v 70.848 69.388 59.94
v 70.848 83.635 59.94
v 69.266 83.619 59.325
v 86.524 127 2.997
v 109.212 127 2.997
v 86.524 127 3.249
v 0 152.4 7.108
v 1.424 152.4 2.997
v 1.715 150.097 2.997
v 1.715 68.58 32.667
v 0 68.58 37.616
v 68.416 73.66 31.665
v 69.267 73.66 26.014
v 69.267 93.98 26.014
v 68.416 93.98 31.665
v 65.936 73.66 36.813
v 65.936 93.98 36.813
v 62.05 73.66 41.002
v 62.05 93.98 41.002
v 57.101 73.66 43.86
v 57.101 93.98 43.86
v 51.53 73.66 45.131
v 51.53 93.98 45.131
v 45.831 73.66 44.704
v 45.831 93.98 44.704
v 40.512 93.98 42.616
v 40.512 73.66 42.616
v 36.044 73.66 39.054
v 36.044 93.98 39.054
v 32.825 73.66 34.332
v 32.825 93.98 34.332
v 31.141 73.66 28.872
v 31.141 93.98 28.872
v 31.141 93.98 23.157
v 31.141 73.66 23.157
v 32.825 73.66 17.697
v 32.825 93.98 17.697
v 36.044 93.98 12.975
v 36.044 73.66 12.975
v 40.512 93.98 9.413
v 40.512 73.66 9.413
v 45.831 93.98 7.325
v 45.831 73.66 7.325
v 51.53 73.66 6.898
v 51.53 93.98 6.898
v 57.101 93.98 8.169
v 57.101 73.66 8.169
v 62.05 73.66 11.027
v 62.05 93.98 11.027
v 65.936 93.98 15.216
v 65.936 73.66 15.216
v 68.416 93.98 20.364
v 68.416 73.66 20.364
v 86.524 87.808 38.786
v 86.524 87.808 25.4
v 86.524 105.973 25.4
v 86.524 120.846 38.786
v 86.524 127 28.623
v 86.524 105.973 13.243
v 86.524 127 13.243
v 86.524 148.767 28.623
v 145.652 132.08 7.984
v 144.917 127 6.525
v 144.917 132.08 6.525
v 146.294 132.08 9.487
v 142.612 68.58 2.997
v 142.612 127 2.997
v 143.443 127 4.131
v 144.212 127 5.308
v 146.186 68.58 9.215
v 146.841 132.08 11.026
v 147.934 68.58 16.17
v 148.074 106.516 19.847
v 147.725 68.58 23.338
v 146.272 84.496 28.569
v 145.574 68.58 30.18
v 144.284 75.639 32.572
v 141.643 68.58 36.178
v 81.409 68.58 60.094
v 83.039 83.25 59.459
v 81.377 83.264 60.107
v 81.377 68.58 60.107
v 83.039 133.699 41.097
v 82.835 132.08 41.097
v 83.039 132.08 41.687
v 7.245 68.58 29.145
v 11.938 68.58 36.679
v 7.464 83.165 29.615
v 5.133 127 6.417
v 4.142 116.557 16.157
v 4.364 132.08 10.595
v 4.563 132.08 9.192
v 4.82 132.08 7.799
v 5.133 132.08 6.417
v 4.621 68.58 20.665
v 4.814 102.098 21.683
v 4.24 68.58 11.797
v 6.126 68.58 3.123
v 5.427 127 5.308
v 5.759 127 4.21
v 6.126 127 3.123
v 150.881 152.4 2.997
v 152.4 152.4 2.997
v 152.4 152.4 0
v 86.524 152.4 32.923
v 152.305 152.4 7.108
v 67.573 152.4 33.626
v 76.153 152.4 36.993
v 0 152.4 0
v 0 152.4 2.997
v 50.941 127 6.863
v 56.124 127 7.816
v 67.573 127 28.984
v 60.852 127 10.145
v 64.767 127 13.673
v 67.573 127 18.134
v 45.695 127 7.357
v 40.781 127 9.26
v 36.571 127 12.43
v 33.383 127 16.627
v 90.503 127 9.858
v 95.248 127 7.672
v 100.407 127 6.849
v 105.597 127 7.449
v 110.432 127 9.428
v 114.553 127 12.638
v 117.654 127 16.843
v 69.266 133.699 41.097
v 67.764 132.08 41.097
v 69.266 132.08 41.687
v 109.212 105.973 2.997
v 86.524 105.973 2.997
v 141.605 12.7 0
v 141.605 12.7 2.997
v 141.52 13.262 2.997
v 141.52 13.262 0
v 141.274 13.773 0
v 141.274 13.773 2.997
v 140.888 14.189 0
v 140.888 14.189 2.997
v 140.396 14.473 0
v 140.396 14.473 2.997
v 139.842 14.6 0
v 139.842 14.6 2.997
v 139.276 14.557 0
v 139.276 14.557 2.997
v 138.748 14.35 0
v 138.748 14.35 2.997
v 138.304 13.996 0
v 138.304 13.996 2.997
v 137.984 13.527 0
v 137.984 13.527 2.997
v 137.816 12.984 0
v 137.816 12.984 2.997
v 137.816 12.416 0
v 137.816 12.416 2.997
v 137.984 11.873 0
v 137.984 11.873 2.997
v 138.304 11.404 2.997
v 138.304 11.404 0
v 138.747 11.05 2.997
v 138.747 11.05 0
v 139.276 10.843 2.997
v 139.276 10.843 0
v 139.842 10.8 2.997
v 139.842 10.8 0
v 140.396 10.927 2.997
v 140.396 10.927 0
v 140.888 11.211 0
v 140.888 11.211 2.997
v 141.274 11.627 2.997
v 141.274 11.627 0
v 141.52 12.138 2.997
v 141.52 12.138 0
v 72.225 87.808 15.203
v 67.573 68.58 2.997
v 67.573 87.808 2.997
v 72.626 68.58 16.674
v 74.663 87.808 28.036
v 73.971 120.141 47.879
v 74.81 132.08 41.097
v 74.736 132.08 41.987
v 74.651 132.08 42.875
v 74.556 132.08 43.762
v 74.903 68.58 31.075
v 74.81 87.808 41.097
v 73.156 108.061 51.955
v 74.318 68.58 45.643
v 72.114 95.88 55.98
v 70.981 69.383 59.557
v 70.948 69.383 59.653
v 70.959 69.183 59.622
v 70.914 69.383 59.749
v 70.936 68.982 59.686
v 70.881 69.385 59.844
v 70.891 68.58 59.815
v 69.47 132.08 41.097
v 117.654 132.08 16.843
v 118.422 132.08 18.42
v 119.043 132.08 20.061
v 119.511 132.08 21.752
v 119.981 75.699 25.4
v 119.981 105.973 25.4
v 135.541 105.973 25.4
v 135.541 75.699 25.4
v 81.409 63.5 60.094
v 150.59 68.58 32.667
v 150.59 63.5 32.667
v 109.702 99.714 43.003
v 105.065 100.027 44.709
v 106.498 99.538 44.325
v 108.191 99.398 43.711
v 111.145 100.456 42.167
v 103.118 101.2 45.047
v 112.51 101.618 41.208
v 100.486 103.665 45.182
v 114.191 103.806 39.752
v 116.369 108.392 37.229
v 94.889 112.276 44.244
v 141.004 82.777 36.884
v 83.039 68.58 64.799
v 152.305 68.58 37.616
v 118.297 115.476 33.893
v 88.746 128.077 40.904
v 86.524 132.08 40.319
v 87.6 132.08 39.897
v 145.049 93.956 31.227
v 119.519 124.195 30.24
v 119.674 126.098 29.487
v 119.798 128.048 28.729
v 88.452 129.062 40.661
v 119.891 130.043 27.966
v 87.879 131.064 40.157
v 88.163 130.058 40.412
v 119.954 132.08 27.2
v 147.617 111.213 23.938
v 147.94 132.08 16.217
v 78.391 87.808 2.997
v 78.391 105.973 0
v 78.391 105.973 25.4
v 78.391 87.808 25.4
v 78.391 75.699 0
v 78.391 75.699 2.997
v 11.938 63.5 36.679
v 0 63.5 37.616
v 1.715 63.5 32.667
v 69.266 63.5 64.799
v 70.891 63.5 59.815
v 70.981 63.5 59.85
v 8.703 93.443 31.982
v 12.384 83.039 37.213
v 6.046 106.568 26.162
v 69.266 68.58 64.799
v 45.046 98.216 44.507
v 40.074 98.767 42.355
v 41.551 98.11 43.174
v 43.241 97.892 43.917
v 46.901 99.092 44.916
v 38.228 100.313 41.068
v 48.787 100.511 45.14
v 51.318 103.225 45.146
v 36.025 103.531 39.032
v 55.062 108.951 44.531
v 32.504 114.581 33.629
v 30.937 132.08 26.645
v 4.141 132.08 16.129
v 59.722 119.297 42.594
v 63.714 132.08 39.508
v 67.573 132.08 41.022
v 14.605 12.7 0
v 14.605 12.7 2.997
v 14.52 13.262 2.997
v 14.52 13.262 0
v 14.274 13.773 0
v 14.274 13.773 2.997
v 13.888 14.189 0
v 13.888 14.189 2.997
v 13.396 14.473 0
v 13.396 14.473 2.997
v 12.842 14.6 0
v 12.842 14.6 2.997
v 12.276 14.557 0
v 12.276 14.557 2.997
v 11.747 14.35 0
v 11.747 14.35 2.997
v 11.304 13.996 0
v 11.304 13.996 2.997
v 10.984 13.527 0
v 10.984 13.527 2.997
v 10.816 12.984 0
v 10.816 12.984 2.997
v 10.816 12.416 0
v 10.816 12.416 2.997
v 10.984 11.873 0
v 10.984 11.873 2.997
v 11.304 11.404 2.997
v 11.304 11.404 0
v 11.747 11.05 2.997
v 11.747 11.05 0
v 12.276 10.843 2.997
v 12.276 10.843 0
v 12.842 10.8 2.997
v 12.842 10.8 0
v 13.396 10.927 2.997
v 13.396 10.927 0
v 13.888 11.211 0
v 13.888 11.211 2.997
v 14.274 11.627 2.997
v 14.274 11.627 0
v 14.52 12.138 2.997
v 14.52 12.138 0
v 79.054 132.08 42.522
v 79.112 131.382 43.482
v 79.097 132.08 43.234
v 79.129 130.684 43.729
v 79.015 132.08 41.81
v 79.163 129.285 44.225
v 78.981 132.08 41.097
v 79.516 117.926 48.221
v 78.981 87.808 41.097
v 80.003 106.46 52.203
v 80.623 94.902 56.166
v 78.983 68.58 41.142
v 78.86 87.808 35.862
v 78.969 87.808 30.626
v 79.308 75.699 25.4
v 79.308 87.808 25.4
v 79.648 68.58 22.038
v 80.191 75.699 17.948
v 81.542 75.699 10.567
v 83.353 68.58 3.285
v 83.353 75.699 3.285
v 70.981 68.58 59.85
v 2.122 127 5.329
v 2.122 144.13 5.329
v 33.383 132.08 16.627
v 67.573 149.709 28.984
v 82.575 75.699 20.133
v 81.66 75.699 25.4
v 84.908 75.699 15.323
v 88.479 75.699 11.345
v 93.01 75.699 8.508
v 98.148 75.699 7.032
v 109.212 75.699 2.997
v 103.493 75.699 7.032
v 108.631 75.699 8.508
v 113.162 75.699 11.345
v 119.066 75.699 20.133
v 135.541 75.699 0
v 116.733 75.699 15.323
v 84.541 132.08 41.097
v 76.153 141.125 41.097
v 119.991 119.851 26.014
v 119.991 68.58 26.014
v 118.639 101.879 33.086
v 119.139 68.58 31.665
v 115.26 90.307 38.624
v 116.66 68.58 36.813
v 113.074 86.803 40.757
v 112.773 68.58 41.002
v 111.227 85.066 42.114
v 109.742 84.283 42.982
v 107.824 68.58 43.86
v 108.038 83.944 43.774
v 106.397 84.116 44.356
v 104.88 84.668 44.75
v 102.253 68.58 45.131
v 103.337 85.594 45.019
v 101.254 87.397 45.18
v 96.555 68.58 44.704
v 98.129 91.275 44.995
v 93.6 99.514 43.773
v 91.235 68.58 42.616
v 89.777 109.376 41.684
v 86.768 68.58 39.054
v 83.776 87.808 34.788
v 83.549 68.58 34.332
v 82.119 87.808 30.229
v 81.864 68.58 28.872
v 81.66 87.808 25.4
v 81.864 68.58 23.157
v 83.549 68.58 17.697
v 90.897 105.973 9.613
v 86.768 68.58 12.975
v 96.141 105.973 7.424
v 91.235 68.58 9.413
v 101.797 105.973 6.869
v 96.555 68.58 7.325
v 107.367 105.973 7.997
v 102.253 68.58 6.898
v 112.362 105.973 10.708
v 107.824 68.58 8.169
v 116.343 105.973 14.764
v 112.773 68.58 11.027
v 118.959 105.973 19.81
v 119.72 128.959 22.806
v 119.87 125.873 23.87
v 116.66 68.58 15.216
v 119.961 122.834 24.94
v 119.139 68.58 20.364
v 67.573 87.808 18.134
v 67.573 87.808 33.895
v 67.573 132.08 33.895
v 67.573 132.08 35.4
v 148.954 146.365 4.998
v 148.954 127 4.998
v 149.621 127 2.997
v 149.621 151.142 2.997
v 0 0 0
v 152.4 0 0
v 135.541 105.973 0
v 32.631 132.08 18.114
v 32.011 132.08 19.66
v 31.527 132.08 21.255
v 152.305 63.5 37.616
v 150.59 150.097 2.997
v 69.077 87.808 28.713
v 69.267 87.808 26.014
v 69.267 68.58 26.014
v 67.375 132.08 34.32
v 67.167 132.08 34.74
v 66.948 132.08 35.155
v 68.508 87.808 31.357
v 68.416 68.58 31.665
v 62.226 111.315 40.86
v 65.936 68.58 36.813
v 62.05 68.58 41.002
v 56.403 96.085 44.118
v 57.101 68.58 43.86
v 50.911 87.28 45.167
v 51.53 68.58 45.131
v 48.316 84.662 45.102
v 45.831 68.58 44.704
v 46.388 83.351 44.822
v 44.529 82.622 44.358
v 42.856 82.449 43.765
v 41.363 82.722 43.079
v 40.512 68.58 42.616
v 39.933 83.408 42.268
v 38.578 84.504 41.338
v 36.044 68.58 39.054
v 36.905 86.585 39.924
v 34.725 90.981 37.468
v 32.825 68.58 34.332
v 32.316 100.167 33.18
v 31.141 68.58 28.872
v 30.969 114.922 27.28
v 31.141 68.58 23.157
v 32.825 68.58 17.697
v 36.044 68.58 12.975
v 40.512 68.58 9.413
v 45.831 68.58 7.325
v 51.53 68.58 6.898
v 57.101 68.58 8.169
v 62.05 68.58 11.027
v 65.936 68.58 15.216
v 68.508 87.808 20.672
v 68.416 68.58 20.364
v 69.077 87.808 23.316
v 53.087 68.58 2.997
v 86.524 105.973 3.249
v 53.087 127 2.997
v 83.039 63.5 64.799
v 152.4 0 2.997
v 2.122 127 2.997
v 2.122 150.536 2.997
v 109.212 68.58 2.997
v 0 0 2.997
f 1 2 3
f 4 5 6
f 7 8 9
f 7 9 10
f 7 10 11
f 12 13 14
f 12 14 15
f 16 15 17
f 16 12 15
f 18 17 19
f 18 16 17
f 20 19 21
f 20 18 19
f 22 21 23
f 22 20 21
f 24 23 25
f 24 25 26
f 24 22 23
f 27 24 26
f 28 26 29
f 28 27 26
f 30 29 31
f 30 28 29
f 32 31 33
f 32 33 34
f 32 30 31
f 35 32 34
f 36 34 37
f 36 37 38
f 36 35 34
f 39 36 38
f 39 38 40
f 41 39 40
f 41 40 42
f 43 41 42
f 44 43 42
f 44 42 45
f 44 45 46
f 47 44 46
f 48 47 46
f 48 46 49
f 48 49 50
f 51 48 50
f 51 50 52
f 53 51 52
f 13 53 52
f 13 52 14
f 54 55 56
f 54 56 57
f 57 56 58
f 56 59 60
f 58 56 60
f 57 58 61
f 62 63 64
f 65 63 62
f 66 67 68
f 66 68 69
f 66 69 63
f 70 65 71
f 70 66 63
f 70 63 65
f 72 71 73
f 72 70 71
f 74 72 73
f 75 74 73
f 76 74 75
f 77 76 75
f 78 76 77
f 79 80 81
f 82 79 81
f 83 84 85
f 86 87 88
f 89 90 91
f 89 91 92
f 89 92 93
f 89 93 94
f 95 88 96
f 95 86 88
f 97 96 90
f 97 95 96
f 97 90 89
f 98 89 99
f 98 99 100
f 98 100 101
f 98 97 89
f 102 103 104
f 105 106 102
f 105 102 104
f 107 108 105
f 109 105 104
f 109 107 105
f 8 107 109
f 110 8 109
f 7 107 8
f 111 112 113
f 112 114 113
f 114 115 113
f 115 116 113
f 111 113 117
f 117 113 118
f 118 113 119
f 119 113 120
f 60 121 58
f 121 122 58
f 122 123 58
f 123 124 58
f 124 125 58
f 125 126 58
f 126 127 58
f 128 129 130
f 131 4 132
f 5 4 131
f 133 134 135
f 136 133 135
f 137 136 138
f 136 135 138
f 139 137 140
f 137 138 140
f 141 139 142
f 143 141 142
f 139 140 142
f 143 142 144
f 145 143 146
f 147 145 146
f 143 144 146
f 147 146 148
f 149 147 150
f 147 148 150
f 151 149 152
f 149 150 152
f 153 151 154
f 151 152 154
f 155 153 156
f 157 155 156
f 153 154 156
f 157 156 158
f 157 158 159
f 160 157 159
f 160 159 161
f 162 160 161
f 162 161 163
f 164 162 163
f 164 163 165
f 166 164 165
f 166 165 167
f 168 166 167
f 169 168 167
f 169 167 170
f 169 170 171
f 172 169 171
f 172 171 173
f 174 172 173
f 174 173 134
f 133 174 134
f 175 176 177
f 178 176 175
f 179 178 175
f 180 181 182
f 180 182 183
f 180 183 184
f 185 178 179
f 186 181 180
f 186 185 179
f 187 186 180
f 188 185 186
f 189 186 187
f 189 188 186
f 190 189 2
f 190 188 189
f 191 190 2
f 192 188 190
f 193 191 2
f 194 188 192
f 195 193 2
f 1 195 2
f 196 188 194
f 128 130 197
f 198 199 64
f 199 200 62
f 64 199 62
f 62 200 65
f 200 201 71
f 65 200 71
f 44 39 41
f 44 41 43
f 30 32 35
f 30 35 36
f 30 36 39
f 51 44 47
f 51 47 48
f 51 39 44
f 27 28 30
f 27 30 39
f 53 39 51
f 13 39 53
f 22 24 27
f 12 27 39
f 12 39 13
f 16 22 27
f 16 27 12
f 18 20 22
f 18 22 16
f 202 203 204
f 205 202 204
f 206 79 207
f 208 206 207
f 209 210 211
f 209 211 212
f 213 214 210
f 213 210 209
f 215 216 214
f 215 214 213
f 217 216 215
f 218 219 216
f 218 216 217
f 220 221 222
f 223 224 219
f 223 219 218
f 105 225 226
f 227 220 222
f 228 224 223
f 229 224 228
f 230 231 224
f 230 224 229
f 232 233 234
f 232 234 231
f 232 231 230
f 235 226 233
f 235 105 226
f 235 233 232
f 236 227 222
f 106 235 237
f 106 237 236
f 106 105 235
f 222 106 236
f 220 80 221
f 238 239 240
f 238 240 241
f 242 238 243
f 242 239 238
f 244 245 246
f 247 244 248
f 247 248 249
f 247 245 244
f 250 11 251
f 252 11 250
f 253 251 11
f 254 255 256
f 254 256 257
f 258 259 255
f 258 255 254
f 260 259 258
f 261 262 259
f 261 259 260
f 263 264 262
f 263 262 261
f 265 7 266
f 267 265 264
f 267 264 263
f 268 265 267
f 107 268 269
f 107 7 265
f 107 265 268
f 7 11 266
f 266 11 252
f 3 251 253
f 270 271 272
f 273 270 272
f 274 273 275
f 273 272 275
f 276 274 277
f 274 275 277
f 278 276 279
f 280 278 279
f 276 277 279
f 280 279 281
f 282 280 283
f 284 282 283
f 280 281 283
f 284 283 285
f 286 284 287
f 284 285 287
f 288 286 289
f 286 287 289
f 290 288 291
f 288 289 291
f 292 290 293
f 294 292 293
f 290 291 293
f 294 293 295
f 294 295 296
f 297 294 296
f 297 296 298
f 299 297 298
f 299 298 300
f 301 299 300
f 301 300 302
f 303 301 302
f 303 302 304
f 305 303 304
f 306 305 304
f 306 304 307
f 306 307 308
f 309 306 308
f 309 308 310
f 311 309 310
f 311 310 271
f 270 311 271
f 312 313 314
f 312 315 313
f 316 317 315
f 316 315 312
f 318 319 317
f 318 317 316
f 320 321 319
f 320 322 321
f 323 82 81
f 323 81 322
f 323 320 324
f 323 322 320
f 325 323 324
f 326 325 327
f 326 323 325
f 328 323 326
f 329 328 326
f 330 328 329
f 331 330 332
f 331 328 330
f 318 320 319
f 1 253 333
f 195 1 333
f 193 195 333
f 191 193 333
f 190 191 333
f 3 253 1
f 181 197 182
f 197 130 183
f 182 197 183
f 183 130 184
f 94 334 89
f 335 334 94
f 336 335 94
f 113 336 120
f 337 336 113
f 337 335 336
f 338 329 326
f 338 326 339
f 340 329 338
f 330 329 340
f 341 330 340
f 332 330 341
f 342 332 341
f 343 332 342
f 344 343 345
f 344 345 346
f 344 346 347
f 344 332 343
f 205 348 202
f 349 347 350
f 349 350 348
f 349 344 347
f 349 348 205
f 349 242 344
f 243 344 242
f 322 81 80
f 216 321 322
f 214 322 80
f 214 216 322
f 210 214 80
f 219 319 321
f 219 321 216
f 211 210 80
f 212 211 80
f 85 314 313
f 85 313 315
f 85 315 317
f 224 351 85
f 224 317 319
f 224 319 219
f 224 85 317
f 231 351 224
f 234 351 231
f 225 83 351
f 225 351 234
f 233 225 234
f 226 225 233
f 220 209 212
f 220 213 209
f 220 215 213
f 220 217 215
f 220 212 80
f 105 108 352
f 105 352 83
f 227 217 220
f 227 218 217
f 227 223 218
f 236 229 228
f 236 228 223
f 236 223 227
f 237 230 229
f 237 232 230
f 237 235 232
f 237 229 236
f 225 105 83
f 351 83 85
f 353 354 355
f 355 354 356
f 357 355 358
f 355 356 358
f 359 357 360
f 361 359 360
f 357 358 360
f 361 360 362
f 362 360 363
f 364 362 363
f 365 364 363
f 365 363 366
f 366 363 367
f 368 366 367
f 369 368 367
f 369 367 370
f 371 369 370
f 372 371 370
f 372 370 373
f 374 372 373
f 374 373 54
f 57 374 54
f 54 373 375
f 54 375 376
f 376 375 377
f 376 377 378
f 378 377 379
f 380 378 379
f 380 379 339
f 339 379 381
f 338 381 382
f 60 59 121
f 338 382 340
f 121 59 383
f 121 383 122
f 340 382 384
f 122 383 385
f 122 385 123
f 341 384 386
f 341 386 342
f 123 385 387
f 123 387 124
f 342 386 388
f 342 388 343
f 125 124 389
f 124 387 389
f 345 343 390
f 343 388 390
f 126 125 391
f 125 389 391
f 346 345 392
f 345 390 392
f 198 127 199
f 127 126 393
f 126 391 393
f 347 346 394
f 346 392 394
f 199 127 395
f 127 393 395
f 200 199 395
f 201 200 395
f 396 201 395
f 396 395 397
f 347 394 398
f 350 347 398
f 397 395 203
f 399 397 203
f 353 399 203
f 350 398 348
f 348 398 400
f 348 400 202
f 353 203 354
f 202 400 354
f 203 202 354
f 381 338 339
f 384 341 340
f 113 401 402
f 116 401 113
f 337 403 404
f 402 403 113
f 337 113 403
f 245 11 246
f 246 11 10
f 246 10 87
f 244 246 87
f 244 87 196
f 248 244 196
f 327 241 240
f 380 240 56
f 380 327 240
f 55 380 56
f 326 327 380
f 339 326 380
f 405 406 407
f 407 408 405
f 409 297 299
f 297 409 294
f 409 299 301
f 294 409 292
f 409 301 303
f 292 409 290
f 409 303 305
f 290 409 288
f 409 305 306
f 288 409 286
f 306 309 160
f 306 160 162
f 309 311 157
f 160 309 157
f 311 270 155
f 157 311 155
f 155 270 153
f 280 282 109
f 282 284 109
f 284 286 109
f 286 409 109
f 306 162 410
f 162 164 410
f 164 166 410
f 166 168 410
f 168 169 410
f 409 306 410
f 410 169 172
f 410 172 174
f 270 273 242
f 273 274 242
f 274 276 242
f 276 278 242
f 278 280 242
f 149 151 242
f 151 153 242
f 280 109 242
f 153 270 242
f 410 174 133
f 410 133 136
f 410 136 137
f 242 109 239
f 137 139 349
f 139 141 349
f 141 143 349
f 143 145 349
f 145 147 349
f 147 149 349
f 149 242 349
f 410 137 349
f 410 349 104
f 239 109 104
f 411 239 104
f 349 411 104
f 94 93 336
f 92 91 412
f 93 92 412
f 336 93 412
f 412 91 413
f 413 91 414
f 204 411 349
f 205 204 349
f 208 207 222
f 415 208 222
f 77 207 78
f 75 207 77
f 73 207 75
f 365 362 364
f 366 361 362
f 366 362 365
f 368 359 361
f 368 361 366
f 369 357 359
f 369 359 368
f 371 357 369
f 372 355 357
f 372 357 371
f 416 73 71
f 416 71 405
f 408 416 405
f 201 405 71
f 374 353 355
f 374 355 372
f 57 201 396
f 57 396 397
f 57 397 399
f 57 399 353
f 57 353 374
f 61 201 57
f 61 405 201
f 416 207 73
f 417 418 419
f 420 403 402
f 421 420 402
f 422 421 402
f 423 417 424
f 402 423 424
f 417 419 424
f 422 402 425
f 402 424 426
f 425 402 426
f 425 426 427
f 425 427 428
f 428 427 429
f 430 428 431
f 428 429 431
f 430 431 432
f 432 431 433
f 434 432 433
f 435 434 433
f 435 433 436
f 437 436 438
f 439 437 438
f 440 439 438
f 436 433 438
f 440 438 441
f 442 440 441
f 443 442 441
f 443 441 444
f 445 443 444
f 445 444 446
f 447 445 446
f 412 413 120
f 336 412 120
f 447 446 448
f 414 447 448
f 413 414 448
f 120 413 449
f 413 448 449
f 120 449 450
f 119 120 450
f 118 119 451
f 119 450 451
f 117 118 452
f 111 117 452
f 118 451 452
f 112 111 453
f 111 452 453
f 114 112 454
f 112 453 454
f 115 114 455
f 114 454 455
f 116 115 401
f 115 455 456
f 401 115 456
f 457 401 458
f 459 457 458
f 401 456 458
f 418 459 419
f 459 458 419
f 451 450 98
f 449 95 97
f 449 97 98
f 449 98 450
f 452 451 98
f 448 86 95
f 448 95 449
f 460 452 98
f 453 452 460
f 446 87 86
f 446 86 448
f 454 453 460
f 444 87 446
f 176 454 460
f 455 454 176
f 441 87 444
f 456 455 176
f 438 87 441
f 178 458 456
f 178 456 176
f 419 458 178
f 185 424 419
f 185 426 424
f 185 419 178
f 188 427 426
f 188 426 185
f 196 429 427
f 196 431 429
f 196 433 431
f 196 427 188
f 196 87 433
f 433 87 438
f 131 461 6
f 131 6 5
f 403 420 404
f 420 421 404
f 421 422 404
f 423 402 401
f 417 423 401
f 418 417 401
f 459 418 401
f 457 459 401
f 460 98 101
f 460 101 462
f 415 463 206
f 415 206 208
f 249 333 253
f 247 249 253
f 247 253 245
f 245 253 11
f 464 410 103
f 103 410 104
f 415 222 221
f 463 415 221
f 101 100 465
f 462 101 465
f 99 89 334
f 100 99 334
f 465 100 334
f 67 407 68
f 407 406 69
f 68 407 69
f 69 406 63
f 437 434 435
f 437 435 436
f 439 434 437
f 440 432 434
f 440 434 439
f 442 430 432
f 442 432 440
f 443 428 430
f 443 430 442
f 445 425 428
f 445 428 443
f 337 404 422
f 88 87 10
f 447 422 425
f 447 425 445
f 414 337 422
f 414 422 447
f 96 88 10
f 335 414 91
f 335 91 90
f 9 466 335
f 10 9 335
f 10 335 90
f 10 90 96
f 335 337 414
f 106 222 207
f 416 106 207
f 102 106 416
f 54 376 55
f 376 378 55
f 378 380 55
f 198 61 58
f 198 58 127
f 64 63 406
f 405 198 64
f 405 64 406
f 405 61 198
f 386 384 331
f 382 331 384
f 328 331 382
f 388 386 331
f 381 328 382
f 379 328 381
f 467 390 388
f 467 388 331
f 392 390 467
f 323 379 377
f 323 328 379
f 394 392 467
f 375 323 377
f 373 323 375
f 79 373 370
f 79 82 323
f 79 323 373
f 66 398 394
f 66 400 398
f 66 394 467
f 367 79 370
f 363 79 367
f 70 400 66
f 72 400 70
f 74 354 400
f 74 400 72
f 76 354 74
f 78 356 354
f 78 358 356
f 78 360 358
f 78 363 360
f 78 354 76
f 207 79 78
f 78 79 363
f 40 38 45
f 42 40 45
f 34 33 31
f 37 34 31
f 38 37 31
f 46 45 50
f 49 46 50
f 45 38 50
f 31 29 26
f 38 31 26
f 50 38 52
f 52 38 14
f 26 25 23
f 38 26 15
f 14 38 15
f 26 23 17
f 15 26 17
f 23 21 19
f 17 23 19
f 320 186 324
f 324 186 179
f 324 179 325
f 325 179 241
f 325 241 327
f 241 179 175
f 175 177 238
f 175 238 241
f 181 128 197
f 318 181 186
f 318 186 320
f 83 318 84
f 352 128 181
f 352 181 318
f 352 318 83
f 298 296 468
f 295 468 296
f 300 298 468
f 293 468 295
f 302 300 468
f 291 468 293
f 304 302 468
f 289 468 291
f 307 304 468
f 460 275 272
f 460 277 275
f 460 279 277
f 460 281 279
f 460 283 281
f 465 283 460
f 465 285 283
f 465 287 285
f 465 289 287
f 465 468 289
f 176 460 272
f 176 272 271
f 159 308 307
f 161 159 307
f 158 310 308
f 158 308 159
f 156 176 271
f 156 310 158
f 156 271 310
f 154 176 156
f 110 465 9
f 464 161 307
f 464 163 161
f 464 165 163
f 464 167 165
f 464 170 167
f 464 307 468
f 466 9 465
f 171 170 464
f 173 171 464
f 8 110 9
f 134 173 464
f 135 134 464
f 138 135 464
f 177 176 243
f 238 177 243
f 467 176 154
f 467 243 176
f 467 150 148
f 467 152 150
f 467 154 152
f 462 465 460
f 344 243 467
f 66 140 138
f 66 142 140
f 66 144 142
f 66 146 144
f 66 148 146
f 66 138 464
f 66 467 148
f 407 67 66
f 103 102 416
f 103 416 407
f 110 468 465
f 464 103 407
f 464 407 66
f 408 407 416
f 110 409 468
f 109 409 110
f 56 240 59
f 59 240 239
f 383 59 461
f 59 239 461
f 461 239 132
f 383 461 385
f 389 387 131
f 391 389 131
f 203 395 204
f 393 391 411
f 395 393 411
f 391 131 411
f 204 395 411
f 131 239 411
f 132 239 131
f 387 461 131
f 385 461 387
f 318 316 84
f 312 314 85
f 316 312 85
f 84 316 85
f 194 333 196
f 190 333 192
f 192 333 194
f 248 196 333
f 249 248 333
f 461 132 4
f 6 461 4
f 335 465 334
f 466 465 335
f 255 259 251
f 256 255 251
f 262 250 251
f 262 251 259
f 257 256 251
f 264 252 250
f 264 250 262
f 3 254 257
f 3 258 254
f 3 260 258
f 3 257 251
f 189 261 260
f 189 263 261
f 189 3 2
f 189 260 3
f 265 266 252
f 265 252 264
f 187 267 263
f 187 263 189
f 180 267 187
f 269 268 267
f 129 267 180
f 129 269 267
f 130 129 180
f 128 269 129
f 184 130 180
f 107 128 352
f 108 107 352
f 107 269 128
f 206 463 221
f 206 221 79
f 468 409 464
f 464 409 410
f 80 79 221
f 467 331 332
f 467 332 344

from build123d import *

# Parameters (mm, degrees)
F0_W      = 152.4
F0_H      = 152.4
F1_DEPTH  = 2.9972
F4_DEPTH  = 101.6
F7_W      = 174.6290246956
F7_H      = 71.9060692936
F8_DEPTH  = 25.4
F9_W      = 190.2633160353
F9_H      = 69.5802671835
F10_DEPTH = 25.4
F11_R     = 19.1702169235
F12_DEPTH = 63.5
F16_W     = 18.951266981
F16_H     = 64.5917784214
F17_DEPTH = 38.1
F14_W     = 142.2051836274
F14_H     = 140.7781180757
F18_DEPTH = 25.4
F13_W     = 73.825603469
F13_H     = 98.4964409136
F19_DEPTH = 25.4
F15_W     = 89.3880832009
F15_H     = 85.1461850107
F20_DEPTH = 25.4
F21_W     = 107.8529264778
F21_H     = 46.1024940014
F22_DEPTH = 25.4
F23_DEPTH = 25.4
F24_DEPTH = 5.08
F26_DEPTH = 5.08
F28_DEPTH = 5.08
F30_DEPTH = 25.4
F31_W     = 57.15
F31_H     = 30.274399312
F32_DEPTH = 25.4
F33_R     = 1.905
F34_DEPTH = 25.4


with BuildPart() as f1:
    # F0 (on Top) → F1 (new body)
    with BuildSketch(Plane.XY):
        with Locations((76.2, 76.2)):
            Rectangle(F0_W, F0_H)
    extrude(amount=F1_DEPTH)

    # F3 (on face) → F4 (join)
    with BuildSketch(Plane(origin=(0, 133.6093050538, -48.6298100606), x_dir=(-1, 0, 0), z_dir=(0, 0.9396926208, -0.3420201433))):
        Polygon((-70.9807611624, 79.6961235199), (-1.7149597029, 54.1526610348), (0, 58.8030900187), (-69.2658014596, 84.3465525037), align=None)
        Polygon((-152.305200696, 58.8030900187), (-150.5902409931, 54.1526610348), (-81.3244395336, 79.6961235199), (-83.0393992364, 84.3465525037), align=None)
    extrude(amount=-F4_DEPTH)

    # F7 (on offset) → F8 (cut)
    with BuildSketch(Plane(origin=(0, 152.4, 0), x_dir=(-1, 0, 0), z_dir=(0, 1, 0))):
        with Locations((-80.1802317146, 12.3004158959)):
            Rectangle(F7_W, F7_H)
    extrude(amount=F8_DEPTH, mode=Mode.SUBTRACT)

    # F9 (on offset) → F10 (cut)
    with BuildSketch(Plane.XZ.offset(-68.58)):
        with Locations((67.1265348792, 43.6987527646)):
            Rectangle(F9_W, F9_H)
    extrude(amount=F10_DEPTH, mode=Mode.SUBTRACT)

    # F11 (on offset) → F12 (join)
    with BuildSketch(Plane.XZ.offset(-68.58)):
        with BuildLine():
            Line((6.1260624789, 3.123100847), (67.5539821386, 2.9584141448))
            ThreePointArc((67.5539821386, 2.9584141448), (74.9057644418, 31.1193454864), (70.8477050066, 59.9398054183))
            Line((70.8477050066, 59.9398054183), (12.3841362074, 37.2131243348))
            ThreePointArc((12.3841362074, 37.2131243348), (4.6825185029, 21.0075238057), (6.1260624789, 3.123100847))
        make_face()
        with Locations((50.0972531736, 26.014469564)):
            Circle(F11_R, mode=Mode.SUBTRACT)
        with BuildLine():
            Line((141.0039812326, 36.8837527931), (81.3766415837, 60.1067829749))
            ThreePointArc((81.3766415837, 60.1067829749), (78.9323729869, 31.5763709769), (83.3530564642, 3.2847394342))
            Line((83.3530564642, 3.2847394342), (142.3214673996, 2.6290433016))
            ThreePointArc((142.3214673996, 2.6290433016), (148.0688436071, 20.0027867534), (141.0039812326, 36.8837527931))
        make_face()
        with Locations((100.8205711842, 26.014469564)):
            Circle(F11_R, mode=Mode.SUBTRACT)
    extrude(amount=-F12_DEPTH)

    # F16 (on face) → F17 (join)
    with BuildSketch(Plane.XY.offset(2.9972)):
        with Locations((77.0484805222, 120.1041107893)):
            Rectangle(F16_W, F16_H)
    extrude(amount=F17_DEPTH)

    # F14 (on face) → F18 (cut)
    with BuildSketch(Plane(origin=(-19.0890698574, 17.7041690946, 48.6418048176), x_dir=(0.9382354929, 0.1183380601, 0.325131148), z_dir=(-0.3459973408, 0.3208954378, 0.8816529692))):
        with Locations((91.4483045925, 70.3890590378)):
            Rectangle(F14_W, F14_H)
    extrude(amount=F18_DEPTH, mode=Mode.SUBTRACT)

    # F13 (on face) → F19 (cut)
    with BuildSketch(Plane(origin=(37.3221590008, 34.6144583712, 95.1024427615), x_dir=(0.9382354929, -0.1183380601, -0.325131148), z_dir=(0.3459973408, 0.3208954378, 0.8816529692))):
        with Locations((85.6396305334, 91.5298976189)):
            Rectangle(F13_W, F13_H)
    extrude(amount=F19_DEPTH, mode=Mode.SUBTRACT)

    # F15 (on face) → F20 (cut)
    with BuildSketch(Plane(origin=(37.3221590008, 34.6144583712, 95.1024427615), x_dir=(0.9382354929, -0.1183380601, -0.325131148), z_dir=(0.3459973408, 0.3208954378, 0.8816529692))):
        with Locations((47.4748036359, 77.4410758168)):
            Rectangle(F15_W, F15_H)
    extrude(amount=F20_DEPTH, mode=Mode.SUBTRACT)

    # F21 (on face) → F22 (cut)
    with BuildSketch(Plane(origin=(37.3221590008, 34.6144583712, 95.1024427615), x_dir=(0.9382354929, -0.1183380601, -0.325131148), z_dir=(0.3459973408, 0.3208954378, 0.8816529692))):
        with Locations((43.8093887642, 129.4138580561)):
            Rectangle(F21_W, F21_H)
    extrude(amount=F22_DEPTH, mode=Mode.SUBTRACT)

    # F25 (on face) → F26 (join)
    with BuildSketch(Plane.XZ.offset(-68.58)):
        Polygon((0, 37.6158626848), (1.7149597029, 32.6669795277), (11.9381580946, 36.6789883131), (70.8914748875, 59.8147248838), (70.9807611624, 59.8497645364), (69.2658014596, 64.7986476935), align=None)
    extrude(amount=F26_DEPTH)

    # F27 (on face) → F28 (join)
    with BuildSketch(Plane.XZ.offset(-68.58)):
        Polygon((83.0393992364, 64.7986476935), (81.4091216737, 60.0941329705), (150.5902409931, 32.6669795277), (152.305200696, 37.6158626848), align=None)
    extrude(amount=F28_DEPTH)

    # F29 (on face) → F30 (join)
    with BuildSketch(Plane(origin=(0, 152.4, 0), x_dir=(-1, 0, 0), z_dir=(0, 1, 0))):
        Polygon((-148.9539146423, 4.9975402653), (-150.1126885414, 1.5212437138), (-2.1217786707, 1.3557064813), (-2.1217786707, 5.3286161274), (-76.7793878913, 32.3112979531), align=None)
    extrude(amount=-F30_DEPTH)

    # F31 (on face) → F32 (cut)
    with BuildSketch(Plane(origin=(0, 0, 0), x_dir=(1, 0, 0), z_dir=(0, 0, -1))):
        with Locations((106.965664196, -90.8361260137)):
            Rectangle(F31_W, F31_H)
    extrude(amount=-F32_DEPTH, mode=Mode.SUBTRACT)

    # F33 (on face) → F34 (cut)
    with BuildSketch(Plane.XY.offset(2.9972)):
        with Locations((12.7, 12.7)):
            Circle(F33_R)
        with Locations((139.7, 12.7)):
            Circle(F33_R)
    extrude(amount=-F34_DEPTH, mode=Mode.SUBTRACT)


with BuildPart() as f23:
    # F11 (on offset) → F23 (new body)
    with BuildSketch(Plane.XZ.offset(-68.58)):
        with Locations((50.0972531736, 26.014469564)):
            Circle(F11_R)
    extrude(amount=-F23_DEPTH)

    # F11 (on offset) → F24 (cut)
    with BuildSketch(Plane.XZ.offset(-68.58)):
        with Locations((50.0972531736, 26.014469564)):
            Circle(F11_R)
    extrude(amount=-F24_DEPTH, mode=Mode.SUBTRACT)


solid = Compound([f1.part, f23.part])
